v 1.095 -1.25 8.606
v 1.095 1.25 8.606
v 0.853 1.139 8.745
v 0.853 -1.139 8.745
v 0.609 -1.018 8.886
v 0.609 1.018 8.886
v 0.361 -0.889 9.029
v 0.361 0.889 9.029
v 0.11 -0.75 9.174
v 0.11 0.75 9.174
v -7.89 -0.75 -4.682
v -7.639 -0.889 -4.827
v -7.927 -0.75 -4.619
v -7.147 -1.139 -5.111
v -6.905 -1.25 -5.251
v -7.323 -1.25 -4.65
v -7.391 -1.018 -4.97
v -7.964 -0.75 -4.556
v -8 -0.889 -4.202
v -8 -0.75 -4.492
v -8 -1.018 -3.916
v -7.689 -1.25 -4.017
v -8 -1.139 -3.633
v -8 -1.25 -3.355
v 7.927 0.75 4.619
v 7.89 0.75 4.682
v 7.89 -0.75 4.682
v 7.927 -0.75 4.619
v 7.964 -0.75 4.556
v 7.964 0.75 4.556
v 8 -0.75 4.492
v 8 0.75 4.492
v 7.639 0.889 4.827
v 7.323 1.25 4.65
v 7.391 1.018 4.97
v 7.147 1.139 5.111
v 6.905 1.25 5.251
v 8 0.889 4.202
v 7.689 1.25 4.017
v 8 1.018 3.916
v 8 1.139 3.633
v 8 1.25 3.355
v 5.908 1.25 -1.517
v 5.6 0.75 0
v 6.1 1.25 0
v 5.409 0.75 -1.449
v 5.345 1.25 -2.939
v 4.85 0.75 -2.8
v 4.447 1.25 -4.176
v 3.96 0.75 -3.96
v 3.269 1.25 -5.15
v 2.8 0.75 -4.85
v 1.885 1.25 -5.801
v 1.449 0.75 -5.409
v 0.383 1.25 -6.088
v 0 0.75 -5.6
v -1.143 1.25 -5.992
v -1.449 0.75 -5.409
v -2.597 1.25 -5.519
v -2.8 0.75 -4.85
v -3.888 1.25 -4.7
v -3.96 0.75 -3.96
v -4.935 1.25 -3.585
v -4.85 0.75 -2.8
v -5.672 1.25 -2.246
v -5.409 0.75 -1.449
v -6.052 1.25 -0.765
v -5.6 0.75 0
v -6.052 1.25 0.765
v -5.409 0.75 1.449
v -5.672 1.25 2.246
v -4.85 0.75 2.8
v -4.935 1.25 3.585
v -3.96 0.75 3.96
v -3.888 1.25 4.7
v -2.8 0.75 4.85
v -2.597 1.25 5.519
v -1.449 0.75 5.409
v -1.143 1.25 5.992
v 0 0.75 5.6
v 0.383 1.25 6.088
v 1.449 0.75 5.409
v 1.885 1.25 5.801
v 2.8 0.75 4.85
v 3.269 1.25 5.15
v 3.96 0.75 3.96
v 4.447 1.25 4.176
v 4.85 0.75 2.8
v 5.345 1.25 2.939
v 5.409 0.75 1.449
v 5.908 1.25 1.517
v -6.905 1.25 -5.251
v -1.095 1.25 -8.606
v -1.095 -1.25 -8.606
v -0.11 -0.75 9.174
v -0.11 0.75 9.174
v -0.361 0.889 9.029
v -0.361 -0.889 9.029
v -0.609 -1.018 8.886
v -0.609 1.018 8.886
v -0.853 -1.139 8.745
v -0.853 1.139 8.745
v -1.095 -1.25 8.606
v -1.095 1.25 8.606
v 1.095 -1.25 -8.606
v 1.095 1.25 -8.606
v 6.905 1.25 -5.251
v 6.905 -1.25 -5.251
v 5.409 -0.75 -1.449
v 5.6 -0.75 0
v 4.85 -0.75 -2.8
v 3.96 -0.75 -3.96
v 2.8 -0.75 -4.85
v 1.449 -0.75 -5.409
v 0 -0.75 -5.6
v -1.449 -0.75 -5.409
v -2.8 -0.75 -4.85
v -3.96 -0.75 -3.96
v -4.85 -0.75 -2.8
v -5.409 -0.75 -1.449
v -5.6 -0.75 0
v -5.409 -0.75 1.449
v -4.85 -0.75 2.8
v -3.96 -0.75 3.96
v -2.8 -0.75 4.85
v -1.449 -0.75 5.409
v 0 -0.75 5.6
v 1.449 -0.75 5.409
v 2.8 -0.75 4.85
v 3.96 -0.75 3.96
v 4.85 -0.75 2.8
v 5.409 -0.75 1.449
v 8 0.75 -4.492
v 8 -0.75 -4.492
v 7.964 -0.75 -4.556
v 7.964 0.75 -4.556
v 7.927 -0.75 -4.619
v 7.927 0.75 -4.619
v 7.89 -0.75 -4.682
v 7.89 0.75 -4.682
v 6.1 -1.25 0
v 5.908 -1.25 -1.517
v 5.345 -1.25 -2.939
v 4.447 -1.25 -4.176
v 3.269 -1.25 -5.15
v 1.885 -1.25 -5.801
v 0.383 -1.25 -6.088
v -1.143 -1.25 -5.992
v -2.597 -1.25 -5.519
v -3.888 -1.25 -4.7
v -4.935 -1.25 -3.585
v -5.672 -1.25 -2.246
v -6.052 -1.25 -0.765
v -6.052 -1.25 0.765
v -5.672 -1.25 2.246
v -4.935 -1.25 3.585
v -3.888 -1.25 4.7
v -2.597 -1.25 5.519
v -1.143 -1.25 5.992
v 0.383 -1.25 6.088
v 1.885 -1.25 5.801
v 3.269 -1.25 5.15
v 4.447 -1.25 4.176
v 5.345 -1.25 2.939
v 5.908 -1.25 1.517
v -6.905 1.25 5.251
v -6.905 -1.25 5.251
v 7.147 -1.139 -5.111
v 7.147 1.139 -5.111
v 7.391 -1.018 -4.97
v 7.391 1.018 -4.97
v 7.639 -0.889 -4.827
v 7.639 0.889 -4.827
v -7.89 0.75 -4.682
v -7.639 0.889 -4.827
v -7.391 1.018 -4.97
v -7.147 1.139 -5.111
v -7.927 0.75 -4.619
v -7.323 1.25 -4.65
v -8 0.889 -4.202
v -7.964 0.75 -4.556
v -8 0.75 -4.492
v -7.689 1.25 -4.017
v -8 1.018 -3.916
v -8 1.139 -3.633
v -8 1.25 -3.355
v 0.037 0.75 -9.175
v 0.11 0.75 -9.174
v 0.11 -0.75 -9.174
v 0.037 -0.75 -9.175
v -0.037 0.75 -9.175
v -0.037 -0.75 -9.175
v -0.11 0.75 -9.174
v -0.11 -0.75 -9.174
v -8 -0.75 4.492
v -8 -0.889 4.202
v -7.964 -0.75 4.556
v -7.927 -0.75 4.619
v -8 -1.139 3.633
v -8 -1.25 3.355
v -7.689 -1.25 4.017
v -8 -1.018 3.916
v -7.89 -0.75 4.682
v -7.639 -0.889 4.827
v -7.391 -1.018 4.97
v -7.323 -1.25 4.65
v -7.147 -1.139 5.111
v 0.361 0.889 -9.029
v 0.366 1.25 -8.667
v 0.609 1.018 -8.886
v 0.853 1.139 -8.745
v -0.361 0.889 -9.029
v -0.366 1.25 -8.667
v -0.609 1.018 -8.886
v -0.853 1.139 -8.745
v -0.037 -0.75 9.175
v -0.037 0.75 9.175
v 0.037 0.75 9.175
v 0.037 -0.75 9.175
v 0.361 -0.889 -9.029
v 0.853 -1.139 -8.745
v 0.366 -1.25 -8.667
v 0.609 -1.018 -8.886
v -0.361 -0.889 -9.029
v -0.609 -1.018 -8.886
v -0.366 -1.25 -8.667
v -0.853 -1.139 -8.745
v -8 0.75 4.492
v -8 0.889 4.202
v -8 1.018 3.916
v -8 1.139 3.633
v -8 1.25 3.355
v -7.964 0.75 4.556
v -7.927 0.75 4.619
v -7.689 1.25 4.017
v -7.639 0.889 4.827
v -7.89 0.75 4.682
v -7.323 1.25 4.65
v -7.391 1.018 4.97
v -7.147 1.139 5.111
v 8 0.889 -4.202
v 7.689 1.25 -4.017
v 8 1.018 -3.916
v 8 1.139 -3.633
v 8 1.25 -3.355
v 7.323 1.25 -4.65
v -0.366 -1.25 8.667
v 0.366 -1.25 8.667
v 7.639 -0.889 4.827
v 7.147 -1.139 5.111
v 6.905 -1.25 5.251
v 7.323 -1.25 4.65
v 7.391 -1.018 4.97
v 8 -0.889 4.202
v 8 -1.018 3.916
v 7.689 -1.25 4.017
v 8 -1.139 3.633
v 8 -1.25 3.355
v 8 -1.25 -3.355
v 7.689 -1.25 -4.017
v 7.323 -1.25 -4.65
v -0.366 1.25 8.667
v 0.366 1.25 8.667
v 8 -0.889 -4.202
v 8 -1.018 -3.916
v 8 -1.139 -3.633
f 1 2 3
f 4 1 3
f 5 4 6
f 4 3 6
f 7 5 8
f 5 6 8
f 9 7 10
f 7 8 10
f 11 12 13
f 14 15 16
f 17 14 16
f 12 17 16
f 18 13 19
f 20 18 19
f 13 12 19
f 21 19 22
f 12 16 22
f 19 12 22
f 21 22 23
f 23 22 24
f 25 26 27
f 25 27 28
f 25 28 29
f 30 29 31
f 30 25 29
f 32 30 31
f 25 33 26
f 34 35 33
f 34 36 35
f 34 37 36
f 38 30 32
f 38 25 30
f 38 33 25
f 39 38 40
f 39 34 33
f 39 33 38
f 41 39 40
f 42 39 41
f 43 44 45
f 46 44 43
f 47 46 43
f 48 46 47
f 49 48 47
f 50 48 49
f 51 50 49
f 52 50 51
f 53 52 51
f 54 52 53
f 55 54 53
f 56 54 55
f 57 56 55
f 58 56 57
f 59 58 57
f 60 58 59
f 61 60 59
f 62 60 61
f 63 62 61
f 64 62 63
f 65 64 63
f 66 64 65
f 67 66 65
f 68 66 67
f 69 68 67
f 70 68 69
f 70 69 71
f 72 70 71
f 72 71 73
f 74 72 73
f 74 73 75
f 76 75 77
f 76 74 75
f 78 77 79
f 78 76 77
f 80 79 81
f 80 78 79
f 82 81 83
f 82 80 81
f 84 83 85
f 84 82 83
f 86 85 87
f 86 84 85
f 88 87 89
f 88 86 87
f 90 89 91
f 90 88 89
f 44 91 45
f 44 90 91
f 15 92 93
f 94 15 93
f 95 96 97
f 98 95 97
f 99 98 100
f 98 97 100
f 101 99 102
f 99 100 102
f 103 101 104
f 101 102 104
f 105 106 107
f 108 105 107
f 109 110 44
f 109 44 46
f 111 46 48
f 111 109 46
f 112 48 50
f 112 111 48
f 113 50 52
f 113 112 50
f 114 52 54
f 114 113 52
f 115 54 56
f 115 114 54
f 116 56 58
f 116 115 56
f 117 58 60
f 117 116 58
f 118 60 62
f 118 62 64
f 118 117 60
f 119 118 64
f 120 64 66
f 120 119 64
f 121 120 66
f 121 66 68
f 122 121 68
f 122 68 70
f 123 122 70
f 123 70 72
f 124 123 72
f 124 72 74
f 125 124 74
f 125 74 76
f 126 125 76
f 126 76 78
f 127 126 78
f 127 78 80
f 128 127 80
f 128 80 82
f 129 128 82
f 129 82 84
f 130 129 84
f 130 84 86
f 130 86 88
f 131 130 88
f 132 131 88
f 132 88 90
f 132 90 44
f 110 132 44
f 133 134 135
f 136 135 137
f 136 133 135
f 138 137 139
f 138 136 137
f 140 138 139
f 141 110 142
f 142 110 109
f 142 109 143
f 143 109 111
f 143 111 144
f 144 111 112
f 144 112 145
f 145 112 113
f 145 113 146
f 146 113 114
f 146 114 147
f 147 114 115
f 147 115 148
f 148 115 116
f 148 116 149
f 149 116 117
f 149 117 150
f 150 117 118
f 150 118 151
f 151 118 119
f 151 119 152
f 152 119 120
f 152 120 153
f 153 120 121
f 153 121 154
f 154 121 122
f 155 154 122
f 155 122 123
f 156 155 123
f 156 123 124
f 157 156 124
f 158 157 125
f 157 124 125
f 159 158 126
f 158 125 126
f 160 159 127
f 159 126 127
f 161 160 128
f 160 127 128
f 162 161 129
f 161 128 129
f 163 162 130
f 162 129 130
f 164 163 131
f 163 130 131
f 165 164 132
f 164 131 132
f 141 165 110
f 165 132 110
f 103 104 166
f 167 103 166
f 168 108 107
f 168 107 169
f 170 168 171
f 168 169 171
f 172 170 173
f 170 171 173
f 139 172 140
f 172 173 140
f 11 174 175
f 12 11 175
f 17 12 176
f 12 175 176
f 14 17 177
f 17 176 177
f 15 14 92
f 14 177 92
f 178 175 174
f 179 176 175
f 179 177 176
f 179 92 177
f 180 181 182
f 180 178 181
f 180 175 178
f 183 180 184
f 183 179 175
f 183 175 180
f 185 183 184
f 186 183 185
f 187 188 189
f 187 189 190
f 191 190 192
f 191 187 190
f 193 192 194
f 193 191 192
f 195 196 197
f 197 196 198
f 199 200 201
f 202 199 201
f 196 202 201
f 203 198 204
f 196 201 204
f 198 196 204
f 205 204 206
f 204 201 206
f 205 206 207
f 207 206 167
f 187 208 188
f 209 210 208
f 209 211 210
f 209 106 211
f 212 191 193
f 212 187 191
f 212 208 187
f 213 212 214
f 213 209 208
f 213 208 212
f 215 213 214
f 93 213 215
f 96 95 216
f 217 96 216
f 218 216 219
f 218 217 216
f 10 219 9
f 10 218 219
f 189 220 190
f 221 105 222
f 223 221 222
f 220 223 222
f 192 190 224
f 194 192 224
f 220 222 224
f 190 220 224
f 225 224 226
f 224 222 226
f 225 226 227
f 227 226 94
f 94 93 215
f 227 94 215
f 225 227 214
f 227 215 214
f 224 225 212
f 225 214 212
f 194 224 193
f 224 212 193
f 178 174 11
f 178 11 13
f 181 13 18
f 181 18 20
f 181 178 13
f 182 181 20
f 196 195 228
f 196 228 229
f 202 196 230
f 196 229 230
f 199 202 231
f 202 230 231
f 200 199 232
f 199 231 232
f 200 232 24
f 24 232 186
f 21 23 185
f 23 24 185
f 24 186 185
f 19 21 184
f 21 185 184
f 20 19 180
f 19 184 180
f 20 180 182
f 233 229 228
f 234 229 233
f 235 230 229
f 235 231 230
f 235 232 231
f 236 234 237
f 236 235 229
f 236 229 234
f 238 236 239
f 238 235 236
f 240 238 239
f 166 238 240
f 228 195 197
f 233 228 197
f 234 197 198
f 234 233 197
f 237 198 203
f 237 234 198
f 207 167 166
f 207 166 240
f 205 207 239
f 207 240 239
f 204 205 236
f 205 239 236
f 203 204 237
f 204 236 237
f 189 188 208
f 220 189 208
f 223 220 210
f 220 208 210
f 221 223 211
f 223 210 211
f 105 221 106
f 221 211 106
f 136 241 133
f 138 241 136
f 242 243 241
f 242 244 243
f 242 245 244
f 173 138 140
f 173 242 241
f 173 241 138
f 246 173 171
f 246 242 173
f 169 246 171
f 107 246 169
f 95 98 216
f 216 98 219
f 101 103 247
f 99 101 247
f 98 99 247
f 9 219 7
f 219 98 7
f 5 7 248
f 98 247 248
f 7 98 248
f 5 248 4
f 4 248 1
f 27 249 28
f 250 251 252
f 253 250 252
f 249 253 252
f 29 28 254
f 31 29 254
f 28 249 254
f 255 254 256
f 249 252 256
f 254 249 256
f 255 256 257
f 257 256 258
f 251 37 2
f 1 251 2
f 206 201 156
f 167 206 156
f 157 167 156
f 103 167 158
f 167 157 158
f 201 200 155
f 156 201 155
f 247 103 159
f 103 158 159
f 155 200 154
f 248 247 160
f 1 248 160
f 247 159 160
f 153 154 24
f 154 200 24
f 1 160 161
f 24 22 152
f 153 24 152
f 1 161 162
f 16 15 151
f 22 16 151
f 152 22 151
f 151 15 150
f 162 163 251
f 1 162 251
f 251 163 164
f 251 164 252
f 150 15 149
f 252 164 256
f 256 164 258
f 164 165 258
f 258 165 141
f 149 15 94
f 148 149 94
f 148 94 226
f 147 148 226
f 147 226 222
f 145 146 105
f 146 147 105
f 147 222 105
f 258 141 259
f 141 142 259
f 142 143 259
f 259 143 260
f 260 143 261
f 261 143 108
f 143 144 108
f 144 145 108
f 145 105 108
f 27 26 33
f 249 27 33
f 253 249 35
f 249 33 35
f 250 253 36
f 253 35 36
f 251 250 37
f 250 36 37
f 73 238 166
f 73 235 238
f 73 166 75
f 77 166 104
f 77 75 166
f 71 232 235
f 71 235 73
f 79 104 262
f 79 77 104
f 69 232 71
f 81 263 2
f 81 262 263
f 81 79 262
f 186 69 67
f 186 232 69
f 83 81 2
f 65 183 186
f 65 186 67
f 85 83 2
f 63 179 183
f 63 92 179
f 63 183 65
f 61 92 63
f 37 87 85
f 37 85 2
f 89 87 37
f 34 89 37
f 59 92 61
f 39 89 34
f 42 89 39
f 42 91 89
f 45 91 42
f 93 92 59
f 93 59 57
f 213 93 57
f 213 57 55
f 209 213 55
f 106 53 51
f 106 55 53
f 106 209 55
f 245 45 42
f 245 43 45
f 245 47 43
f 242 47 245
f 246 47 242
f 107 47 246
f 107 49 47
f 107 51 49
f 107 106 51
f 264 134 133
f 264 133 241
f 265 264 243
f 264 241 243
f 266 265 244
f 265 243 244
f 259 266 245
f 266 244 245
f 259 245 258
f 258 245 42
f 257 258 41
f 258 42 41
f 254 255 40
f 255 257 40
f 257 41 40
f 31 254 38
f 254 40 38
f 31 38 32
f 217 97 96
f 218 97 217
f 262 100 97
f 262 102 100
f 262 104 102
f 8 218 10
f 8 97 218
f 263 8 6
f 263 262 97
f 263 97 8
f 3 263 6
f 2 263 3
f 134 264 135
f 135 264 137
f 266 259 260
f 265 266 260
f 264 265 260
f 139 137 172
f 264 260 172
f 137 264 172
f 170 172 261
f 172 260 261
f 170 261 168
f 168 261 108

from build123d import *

# Parameters (mm, degrees)
SKETCH1_R           = 9.175
SKETCH1_R_2         = 5.6
BOSS_EXTRUDE1_DEPTH = 1.25
CHAMFER1_SIZE       = 0.5
CUT_EXTRUDE1_REACH  = 4.5
CHAMFER2_SIZE       = 0.5


with BuildPart() as part:
    # Sketch1 → Boss-Extrude1 (new body, symmetric)
    with BuildSketch(Plane(origin=(0, 0, 0), x_dir=(1, 0, 0), z_dir=(0, 1, 0))):
        Circle(SKETCH1_R)
        Circle(SKETCH1_R_2, mode=Mode.SUBTRACT)
    extrude(amount=BOSS_EXTRUDE1_DEPTH, both=True)

    # Chamfer1
    chamfer1_edges = [part.edges().sort_by_distance(p)[0] for p in [
        (-9.175, -1.25, 0),
        (-9.175, 1.25, 0),
    ]]
    chamfer(chamfer1_edges, length=CHAMFER1_SIZE)

    # Sketch2 → Cut-Extrude1 (cut, up to next)
    with BuildSketch(Plane(origin=(0, 1.25, 0), x_dir=(1, 0, 0), z_dir=(0, 1, 0)), mode=Mode.PRIVATE) as cut_extrude1_sk1:
        with BuildLine():
            ThreePointArc((-8, 3.354940387), (-8.675, 0), (-8, -3.354940387))
            Line((-8, -3.354940387), (-8, 3.354940387))
        make_face()
    cut_extrude1_tool1 = extrude(cut_extrude1_sk1.sketch, amount=-CUT_EXTRUDE1_REACH, mode=Mode.PRIVATE) & part.part
    add(cut_extrude1_tool1.solids().sort_by_distance((-8.270921, 1.25, 0))[0], mode=Mode.SUBTRACT)
    # Sketch2 → Cut-Extrude1 (cut, up to next)
    with BuildSketch(Plane(origin=(0, 1.25, 0), x_dir=(1, 0, 0), z_dir=(0, 1, 0)), mode=Mode.PRIVATE) as cut_extrude1_sk2:
        with BuildLine():
            ThreePointArc((-8, 4.492285053), (-9.175, 0), (-8, -4.492285053))
            Line((-8, -4.492285053), (-8, -3.354940387))
            ThreePointArc((-8, -3.354940387), (-8.675, 0), (-8, 3.354940387))
            Line((-8, 3.354940387), (-8, 4.492285053))
        make_face()
    cut_extrude1_tool2 = extrude(cut_extrude1_sk2.sketch, amount=-CUT_EXTRUDE1_REACH, mode=Mode.PRIVATE) & part.part
    add(cut_extrude1_tool2.solids().sort_by_distance((-9.084389, 1.25, 0))[0], mode=Mode.SUBTRACT)
    # Sketch2 → Cut-Extrude1 (cut, up to next)
    with BuildSketch(Plane(origin=(0, 1.25, 0), x_dir=(1, 0, 0), z_dir=(0, 1, 0)), mode=Mode.PRIVATE) as cut_extrude1_sk3:
        with BuildLine():
            ThreePointArc((-0.109567023, 9.174345757), (-4.5875, 7.94578308), (-7.890432977, 4.682060704))
            Line((-7.890432977, 4.682060704), (-6.905463603, 5.250733037))
            ThreePointArc((-6.905463603, 5.250733037), (-4.3375, 7.512770378), (-1.094536397, 8.605673424))
            Line((-1.094536397, 8.605673424), (-0.109567023, 9.174345757))
        make_face()
    cut_extrude1_tool3 = extrude(cut_extrude1_sk3.sketch, amount=-CUT_EXTRUDE1_REACH, mode=Mode.PRIVATE) & part.part
    add(cut_extrude1_tool3.solids().sort_by_distance((-4.382423, 1.25, -7.590579))[0], mode=Mode.SUBTRACT)
    # Sketch2 → Cut-Extrude1 (cut, up to next)
    with BuildSketch(Plane(origin=(0, 1.25, 0), x_dir=(1, 0, 0), z_dir=(0, 1, 0)), mode=Mode.PRIVATE) as cut_extrude1_sk4:
        with BuildLine():
            ThreePointArc((-1.094536397, 8.605673424), (-4.3375, 7.512770378), (-6.905463603, 5.250733037))
            Line((-6.905463603, 5.250733037), (-1.094536397, 8.605673424))
        make_face()
    cut_extrude1_tool4 = extrude(cut_extrude1_sk4.sketch, amount=-CUT_EXTRUDE1_REACH, mode=Mode.PRIVATE) & part.part
    add(cut_extrude1_tool4.solids().sort_by_distance((-4.135461, 1.25, -7.162828))[0], mode=Mode.SUBTRACT)
    # Sketch2 → Cut-Extrude1 (cut, up to next)
    with BuildSketch(Plane(origin=(0, 1.25, 0), x_dir=(1, 0, 0), z_dir=(0, 1, 0)), mode=Mode.PRIVATE) as cut_extrude1_sk5:
        with BuildLine():
            ThreePointArc((1.094536397, 8.605673424), (4.3375, 7.512770378), (6.905463603, 5.250733037))
            Line((6.905463603, 5.250733037), (7.890432977, 4.682060704))
            ThreePointArc((7.890432977, 4.682060704), (4.5875, 7.94578308), (0.109567023, 9.174345757))
            Line((0.109567023, 9.174345757), (1.094536397, 8.605673424))
        make_face()
    cut_extrude1_tool5 = extrude(cut_extrude1_sk5.sketch, amount=-CUT_EXTRUDE1_REACH, mode=Mode.PRIVATE) & part.part
    add(cut_extrude1_tool5.solids().sort_by_distance((7.442871, 1.25, -5.044206))[0], mode=Mode.SUBTRACT)
    # Sketch2 → Cut-Extrude1 (cut, up to next)
    with BuildSketch(Plane(origin=(0, 1.25, 0), x_dir=(1, 0, 0), z_dir=(0, 1, 0)), mode=Mode.PRIVATE) as cut_extrude1_sk6:
        with BuildLine():
            Line((1.094536397, 8.605673424), (6.905463603, 5.250733037))
            ThreePointArc((6.905463603, 5.250733037), (4.3375, 7.512770378), (1.094536397, 8.605673424))
        make_face()
    cut_extrude1_tool6 = extrude(cut_extrude1_sk6.sketch, amount=-CUT_EXTRUDE1_REACH, mode=Mode.PRIVATE) & part.part
    add(cut_extrude1_tool6.solids().sort_by_distance((4.135461, 1.25, -7.162828))[0], mode=Mode.SUBTRACT)
    # Sketch2 → Cut-Extrude1 (cut, up to next)
    with BuildSketch(Plane(origin=(0, 1.25, 0), x_dir=(1, 0, 0), z_dir=(0, 1, 0)), mode=Mode.PRIVATE) as cut_extrude1_sk7:
        with BuildLine():
            Line((8, -3.354940387), (8, -4.492285053))
            ThreePointArc((8, -4.492285053), (8.876390736, -2.321704654), (9.175, 0))
            ThreePointArc((9.175, 0), (8.876390736, 2.321704654), (8, 4.492285053))
            Line((8, 4.492285053), (8, 3.354940387))
            ThreePointArc((8, 3.354940387), (8.504575974, 1.711085182), (8.675, 0))
            ThreePointArc((8.675, 0), (8.504575974, -1.711085182), (8, -3.354940387))
        make_face()
    cut_extrude1_tool7 = extrude(cut_extrude1_sk7.sketch, amount=-CUT_EXTRUDE1_REACH, mode=Mode.PRIVATE) & part.part
    add(cut_extrude1_tool7.solids().sort_by_distance((8.090611, 1.25, 3.923613))[0], mode=Mode.SUBTRACT)
    # Sketch2 → Cut-Extrude1 (cut, up to next)
    with BuildSketch(Plane(origin=(0, 1.25, 0), x_dir=(1, 0, 0), z_dir=(0, 1, 0)), mode=Mode.PRIVATE) as cut_extrude1_sk8:
        with BuildLine():
            Line((8, 3.354940387), (8, -3.354940387))
            ThreePointArc((8, -3.354940387), (8.504575974, -1.711085182), (8.675, 0))
            ThreePointArc((8.675, 0), (8.504575974, 1.711085182), (8, 3.354940387))
        make_face()
    cut_extrude1_tool8 = extrude(cut_extrude1_sk8.sketch, amount=-CUT_EXTRUDE1_REACH, mode=Mode.PRIVATE) & part.part
    add(cut_extrude1_tool8.solids().sort_by_distance((8.270921, 1.25, 0))[0], mode=Mode.SUBTRACT)
    # Sketch2 → Cut-Extrude1 (cut, up to next)
    with BuildSketch(Plane(origin=(0, 1.25, 0), x_dir=(1, 0, 0), z_dir=(0, 1, 0)), mode=Mode.PRIVATE) as cut_extrude1_sk9:
        with BuildLine():
            Line((1.094536397, -8.605673424), (0.109567023, -9.174345757))
            ThreePointArc((0.109567023, -9.174345757), (4.5875, -7.94578308), (7.890432977, -4.682060704))
            Line((7.890432977, -4.682060704), (6.905463603, -5.250733037))
            ThreePointArc((6.905463603, -5.250733037), (4.3375, -7.512770378), (1.094536397, -8.605673424))
        make_face()
    cut_extrude1_tool9 = extrude(cut_extrude1_sk9.sketch, amount=-CUT_EXTRUDE1_REACH, mode=Mode.PRIVATE) & part.part
    add(cut_extrude1_tool9.solids().sort_by_distance((4.382423, 1.25, 7.590579))[0], mode=Mode.SUBTRACT)
    # Sketch2 → Cut-Extrude1 (cut, up to next)
    with BuildSketch(Plane(origin=(0, 1.25, 0), x_dir=(1, 0, 0), z_dir=(0, 1, 0)), mode=Mode.PRIVATE) as cut_extrude1_sk10:
        with BuildLine():
            Line((6.905463603, -5.250733037), (1.094536397, -8.605673424))
            ThreePointArc((1.094536397, -8.605673424), (4.3375, -7.512770378), (6.905463603, -5.250733037))
        make_face()
    cut_extrude1_tool10 = extrude(cut_extrude1_sk10.sketch, amount=-CUT_EXTRUDE1_REACH, mode=Mode.PRIVATE) & part.part
    add(cut_extrude1_tool10.solids().sort_by_distance((4.135461, 1.25, 7.162828))[0], mode=Mode.SUBTRACT)
    # Sketch2 → Cut-Extrude1 (cut, up to next)
    with BuildSketch(Plane(origin=(0, 1.25, 0), x_dir=(1, 0, 0), z_dir=(0, 1, 0)), mode=Mode.PRIVATE) as cut_extrude1_sk11:
        with BuildLine():
            ThreePointArc((-6.905463603, -5.250733037), (-4.3375, -7.512770378), (-1.094536397, -8.605673424))
            Line((-1.094536397, -8.605673424), (-6.905463603, -5.250733037))
        make_face()
    cut_extrude1_tool11 = extrude(cut_extrude1_sk11.sketch, amount=-CUT_EXTRUDE1_REACH, mode=Mode.PRIVATE) & part.part
    add(cut_extrude1_tool11.solids().sort_by_distance((-4.135461, 1.25, 7.162828))[0], mode=Mode.SUBTRACT)
    # Sketch2 → Cut-Extrude1 (cut, up to next)
    with BuildSketch(Plane(origin=(0, 1.25, 0), x_dir=(1, 0, 0), z_dir=(0, 1, 0)), mode=Mode.PRIVATE) as cut_extrude1_sk12:
        with BuildLine():
            ThreePointArc((-7.890432977, -4.682060704), (-4.5875, -7.94578308), (-0.109567023, -9.174345757))
            Line((-0.109567023, -9.174345757), (-1.094536397, -8.605673424))
            ThreePointArc((-1.094536397, -8.605673424), (-4.3375, -7.512770378), (-6.905463603, -5.250733037))
            Line((-6.905463603, -5.250733037), (-7.890432977, -4.682060704))
        make_face()
    cut_extrude1_tool12 = extrude(cut_extrude1_sk12.sketch, amount=-CUT_EXTRUDE1_REACH, mode=Mode.PRIVATE) & part.part
    add(cut_extrude1_tool12.solids().sort_by_distance((-7.442871, 1.25, 5.044206))[0], mode=Mode.SUBTRACT)

    # Chamfer2
    chamfer2_edges = [part.edges().sort_by_distance(p)[0] for p in [
        (-5.6, -1.25, 0),
        (-5.6, 1.25, 0),
    ]]
    chamfer(chamfer2_edges, length=CHAMFER2_SIZE)


solid = part.part
